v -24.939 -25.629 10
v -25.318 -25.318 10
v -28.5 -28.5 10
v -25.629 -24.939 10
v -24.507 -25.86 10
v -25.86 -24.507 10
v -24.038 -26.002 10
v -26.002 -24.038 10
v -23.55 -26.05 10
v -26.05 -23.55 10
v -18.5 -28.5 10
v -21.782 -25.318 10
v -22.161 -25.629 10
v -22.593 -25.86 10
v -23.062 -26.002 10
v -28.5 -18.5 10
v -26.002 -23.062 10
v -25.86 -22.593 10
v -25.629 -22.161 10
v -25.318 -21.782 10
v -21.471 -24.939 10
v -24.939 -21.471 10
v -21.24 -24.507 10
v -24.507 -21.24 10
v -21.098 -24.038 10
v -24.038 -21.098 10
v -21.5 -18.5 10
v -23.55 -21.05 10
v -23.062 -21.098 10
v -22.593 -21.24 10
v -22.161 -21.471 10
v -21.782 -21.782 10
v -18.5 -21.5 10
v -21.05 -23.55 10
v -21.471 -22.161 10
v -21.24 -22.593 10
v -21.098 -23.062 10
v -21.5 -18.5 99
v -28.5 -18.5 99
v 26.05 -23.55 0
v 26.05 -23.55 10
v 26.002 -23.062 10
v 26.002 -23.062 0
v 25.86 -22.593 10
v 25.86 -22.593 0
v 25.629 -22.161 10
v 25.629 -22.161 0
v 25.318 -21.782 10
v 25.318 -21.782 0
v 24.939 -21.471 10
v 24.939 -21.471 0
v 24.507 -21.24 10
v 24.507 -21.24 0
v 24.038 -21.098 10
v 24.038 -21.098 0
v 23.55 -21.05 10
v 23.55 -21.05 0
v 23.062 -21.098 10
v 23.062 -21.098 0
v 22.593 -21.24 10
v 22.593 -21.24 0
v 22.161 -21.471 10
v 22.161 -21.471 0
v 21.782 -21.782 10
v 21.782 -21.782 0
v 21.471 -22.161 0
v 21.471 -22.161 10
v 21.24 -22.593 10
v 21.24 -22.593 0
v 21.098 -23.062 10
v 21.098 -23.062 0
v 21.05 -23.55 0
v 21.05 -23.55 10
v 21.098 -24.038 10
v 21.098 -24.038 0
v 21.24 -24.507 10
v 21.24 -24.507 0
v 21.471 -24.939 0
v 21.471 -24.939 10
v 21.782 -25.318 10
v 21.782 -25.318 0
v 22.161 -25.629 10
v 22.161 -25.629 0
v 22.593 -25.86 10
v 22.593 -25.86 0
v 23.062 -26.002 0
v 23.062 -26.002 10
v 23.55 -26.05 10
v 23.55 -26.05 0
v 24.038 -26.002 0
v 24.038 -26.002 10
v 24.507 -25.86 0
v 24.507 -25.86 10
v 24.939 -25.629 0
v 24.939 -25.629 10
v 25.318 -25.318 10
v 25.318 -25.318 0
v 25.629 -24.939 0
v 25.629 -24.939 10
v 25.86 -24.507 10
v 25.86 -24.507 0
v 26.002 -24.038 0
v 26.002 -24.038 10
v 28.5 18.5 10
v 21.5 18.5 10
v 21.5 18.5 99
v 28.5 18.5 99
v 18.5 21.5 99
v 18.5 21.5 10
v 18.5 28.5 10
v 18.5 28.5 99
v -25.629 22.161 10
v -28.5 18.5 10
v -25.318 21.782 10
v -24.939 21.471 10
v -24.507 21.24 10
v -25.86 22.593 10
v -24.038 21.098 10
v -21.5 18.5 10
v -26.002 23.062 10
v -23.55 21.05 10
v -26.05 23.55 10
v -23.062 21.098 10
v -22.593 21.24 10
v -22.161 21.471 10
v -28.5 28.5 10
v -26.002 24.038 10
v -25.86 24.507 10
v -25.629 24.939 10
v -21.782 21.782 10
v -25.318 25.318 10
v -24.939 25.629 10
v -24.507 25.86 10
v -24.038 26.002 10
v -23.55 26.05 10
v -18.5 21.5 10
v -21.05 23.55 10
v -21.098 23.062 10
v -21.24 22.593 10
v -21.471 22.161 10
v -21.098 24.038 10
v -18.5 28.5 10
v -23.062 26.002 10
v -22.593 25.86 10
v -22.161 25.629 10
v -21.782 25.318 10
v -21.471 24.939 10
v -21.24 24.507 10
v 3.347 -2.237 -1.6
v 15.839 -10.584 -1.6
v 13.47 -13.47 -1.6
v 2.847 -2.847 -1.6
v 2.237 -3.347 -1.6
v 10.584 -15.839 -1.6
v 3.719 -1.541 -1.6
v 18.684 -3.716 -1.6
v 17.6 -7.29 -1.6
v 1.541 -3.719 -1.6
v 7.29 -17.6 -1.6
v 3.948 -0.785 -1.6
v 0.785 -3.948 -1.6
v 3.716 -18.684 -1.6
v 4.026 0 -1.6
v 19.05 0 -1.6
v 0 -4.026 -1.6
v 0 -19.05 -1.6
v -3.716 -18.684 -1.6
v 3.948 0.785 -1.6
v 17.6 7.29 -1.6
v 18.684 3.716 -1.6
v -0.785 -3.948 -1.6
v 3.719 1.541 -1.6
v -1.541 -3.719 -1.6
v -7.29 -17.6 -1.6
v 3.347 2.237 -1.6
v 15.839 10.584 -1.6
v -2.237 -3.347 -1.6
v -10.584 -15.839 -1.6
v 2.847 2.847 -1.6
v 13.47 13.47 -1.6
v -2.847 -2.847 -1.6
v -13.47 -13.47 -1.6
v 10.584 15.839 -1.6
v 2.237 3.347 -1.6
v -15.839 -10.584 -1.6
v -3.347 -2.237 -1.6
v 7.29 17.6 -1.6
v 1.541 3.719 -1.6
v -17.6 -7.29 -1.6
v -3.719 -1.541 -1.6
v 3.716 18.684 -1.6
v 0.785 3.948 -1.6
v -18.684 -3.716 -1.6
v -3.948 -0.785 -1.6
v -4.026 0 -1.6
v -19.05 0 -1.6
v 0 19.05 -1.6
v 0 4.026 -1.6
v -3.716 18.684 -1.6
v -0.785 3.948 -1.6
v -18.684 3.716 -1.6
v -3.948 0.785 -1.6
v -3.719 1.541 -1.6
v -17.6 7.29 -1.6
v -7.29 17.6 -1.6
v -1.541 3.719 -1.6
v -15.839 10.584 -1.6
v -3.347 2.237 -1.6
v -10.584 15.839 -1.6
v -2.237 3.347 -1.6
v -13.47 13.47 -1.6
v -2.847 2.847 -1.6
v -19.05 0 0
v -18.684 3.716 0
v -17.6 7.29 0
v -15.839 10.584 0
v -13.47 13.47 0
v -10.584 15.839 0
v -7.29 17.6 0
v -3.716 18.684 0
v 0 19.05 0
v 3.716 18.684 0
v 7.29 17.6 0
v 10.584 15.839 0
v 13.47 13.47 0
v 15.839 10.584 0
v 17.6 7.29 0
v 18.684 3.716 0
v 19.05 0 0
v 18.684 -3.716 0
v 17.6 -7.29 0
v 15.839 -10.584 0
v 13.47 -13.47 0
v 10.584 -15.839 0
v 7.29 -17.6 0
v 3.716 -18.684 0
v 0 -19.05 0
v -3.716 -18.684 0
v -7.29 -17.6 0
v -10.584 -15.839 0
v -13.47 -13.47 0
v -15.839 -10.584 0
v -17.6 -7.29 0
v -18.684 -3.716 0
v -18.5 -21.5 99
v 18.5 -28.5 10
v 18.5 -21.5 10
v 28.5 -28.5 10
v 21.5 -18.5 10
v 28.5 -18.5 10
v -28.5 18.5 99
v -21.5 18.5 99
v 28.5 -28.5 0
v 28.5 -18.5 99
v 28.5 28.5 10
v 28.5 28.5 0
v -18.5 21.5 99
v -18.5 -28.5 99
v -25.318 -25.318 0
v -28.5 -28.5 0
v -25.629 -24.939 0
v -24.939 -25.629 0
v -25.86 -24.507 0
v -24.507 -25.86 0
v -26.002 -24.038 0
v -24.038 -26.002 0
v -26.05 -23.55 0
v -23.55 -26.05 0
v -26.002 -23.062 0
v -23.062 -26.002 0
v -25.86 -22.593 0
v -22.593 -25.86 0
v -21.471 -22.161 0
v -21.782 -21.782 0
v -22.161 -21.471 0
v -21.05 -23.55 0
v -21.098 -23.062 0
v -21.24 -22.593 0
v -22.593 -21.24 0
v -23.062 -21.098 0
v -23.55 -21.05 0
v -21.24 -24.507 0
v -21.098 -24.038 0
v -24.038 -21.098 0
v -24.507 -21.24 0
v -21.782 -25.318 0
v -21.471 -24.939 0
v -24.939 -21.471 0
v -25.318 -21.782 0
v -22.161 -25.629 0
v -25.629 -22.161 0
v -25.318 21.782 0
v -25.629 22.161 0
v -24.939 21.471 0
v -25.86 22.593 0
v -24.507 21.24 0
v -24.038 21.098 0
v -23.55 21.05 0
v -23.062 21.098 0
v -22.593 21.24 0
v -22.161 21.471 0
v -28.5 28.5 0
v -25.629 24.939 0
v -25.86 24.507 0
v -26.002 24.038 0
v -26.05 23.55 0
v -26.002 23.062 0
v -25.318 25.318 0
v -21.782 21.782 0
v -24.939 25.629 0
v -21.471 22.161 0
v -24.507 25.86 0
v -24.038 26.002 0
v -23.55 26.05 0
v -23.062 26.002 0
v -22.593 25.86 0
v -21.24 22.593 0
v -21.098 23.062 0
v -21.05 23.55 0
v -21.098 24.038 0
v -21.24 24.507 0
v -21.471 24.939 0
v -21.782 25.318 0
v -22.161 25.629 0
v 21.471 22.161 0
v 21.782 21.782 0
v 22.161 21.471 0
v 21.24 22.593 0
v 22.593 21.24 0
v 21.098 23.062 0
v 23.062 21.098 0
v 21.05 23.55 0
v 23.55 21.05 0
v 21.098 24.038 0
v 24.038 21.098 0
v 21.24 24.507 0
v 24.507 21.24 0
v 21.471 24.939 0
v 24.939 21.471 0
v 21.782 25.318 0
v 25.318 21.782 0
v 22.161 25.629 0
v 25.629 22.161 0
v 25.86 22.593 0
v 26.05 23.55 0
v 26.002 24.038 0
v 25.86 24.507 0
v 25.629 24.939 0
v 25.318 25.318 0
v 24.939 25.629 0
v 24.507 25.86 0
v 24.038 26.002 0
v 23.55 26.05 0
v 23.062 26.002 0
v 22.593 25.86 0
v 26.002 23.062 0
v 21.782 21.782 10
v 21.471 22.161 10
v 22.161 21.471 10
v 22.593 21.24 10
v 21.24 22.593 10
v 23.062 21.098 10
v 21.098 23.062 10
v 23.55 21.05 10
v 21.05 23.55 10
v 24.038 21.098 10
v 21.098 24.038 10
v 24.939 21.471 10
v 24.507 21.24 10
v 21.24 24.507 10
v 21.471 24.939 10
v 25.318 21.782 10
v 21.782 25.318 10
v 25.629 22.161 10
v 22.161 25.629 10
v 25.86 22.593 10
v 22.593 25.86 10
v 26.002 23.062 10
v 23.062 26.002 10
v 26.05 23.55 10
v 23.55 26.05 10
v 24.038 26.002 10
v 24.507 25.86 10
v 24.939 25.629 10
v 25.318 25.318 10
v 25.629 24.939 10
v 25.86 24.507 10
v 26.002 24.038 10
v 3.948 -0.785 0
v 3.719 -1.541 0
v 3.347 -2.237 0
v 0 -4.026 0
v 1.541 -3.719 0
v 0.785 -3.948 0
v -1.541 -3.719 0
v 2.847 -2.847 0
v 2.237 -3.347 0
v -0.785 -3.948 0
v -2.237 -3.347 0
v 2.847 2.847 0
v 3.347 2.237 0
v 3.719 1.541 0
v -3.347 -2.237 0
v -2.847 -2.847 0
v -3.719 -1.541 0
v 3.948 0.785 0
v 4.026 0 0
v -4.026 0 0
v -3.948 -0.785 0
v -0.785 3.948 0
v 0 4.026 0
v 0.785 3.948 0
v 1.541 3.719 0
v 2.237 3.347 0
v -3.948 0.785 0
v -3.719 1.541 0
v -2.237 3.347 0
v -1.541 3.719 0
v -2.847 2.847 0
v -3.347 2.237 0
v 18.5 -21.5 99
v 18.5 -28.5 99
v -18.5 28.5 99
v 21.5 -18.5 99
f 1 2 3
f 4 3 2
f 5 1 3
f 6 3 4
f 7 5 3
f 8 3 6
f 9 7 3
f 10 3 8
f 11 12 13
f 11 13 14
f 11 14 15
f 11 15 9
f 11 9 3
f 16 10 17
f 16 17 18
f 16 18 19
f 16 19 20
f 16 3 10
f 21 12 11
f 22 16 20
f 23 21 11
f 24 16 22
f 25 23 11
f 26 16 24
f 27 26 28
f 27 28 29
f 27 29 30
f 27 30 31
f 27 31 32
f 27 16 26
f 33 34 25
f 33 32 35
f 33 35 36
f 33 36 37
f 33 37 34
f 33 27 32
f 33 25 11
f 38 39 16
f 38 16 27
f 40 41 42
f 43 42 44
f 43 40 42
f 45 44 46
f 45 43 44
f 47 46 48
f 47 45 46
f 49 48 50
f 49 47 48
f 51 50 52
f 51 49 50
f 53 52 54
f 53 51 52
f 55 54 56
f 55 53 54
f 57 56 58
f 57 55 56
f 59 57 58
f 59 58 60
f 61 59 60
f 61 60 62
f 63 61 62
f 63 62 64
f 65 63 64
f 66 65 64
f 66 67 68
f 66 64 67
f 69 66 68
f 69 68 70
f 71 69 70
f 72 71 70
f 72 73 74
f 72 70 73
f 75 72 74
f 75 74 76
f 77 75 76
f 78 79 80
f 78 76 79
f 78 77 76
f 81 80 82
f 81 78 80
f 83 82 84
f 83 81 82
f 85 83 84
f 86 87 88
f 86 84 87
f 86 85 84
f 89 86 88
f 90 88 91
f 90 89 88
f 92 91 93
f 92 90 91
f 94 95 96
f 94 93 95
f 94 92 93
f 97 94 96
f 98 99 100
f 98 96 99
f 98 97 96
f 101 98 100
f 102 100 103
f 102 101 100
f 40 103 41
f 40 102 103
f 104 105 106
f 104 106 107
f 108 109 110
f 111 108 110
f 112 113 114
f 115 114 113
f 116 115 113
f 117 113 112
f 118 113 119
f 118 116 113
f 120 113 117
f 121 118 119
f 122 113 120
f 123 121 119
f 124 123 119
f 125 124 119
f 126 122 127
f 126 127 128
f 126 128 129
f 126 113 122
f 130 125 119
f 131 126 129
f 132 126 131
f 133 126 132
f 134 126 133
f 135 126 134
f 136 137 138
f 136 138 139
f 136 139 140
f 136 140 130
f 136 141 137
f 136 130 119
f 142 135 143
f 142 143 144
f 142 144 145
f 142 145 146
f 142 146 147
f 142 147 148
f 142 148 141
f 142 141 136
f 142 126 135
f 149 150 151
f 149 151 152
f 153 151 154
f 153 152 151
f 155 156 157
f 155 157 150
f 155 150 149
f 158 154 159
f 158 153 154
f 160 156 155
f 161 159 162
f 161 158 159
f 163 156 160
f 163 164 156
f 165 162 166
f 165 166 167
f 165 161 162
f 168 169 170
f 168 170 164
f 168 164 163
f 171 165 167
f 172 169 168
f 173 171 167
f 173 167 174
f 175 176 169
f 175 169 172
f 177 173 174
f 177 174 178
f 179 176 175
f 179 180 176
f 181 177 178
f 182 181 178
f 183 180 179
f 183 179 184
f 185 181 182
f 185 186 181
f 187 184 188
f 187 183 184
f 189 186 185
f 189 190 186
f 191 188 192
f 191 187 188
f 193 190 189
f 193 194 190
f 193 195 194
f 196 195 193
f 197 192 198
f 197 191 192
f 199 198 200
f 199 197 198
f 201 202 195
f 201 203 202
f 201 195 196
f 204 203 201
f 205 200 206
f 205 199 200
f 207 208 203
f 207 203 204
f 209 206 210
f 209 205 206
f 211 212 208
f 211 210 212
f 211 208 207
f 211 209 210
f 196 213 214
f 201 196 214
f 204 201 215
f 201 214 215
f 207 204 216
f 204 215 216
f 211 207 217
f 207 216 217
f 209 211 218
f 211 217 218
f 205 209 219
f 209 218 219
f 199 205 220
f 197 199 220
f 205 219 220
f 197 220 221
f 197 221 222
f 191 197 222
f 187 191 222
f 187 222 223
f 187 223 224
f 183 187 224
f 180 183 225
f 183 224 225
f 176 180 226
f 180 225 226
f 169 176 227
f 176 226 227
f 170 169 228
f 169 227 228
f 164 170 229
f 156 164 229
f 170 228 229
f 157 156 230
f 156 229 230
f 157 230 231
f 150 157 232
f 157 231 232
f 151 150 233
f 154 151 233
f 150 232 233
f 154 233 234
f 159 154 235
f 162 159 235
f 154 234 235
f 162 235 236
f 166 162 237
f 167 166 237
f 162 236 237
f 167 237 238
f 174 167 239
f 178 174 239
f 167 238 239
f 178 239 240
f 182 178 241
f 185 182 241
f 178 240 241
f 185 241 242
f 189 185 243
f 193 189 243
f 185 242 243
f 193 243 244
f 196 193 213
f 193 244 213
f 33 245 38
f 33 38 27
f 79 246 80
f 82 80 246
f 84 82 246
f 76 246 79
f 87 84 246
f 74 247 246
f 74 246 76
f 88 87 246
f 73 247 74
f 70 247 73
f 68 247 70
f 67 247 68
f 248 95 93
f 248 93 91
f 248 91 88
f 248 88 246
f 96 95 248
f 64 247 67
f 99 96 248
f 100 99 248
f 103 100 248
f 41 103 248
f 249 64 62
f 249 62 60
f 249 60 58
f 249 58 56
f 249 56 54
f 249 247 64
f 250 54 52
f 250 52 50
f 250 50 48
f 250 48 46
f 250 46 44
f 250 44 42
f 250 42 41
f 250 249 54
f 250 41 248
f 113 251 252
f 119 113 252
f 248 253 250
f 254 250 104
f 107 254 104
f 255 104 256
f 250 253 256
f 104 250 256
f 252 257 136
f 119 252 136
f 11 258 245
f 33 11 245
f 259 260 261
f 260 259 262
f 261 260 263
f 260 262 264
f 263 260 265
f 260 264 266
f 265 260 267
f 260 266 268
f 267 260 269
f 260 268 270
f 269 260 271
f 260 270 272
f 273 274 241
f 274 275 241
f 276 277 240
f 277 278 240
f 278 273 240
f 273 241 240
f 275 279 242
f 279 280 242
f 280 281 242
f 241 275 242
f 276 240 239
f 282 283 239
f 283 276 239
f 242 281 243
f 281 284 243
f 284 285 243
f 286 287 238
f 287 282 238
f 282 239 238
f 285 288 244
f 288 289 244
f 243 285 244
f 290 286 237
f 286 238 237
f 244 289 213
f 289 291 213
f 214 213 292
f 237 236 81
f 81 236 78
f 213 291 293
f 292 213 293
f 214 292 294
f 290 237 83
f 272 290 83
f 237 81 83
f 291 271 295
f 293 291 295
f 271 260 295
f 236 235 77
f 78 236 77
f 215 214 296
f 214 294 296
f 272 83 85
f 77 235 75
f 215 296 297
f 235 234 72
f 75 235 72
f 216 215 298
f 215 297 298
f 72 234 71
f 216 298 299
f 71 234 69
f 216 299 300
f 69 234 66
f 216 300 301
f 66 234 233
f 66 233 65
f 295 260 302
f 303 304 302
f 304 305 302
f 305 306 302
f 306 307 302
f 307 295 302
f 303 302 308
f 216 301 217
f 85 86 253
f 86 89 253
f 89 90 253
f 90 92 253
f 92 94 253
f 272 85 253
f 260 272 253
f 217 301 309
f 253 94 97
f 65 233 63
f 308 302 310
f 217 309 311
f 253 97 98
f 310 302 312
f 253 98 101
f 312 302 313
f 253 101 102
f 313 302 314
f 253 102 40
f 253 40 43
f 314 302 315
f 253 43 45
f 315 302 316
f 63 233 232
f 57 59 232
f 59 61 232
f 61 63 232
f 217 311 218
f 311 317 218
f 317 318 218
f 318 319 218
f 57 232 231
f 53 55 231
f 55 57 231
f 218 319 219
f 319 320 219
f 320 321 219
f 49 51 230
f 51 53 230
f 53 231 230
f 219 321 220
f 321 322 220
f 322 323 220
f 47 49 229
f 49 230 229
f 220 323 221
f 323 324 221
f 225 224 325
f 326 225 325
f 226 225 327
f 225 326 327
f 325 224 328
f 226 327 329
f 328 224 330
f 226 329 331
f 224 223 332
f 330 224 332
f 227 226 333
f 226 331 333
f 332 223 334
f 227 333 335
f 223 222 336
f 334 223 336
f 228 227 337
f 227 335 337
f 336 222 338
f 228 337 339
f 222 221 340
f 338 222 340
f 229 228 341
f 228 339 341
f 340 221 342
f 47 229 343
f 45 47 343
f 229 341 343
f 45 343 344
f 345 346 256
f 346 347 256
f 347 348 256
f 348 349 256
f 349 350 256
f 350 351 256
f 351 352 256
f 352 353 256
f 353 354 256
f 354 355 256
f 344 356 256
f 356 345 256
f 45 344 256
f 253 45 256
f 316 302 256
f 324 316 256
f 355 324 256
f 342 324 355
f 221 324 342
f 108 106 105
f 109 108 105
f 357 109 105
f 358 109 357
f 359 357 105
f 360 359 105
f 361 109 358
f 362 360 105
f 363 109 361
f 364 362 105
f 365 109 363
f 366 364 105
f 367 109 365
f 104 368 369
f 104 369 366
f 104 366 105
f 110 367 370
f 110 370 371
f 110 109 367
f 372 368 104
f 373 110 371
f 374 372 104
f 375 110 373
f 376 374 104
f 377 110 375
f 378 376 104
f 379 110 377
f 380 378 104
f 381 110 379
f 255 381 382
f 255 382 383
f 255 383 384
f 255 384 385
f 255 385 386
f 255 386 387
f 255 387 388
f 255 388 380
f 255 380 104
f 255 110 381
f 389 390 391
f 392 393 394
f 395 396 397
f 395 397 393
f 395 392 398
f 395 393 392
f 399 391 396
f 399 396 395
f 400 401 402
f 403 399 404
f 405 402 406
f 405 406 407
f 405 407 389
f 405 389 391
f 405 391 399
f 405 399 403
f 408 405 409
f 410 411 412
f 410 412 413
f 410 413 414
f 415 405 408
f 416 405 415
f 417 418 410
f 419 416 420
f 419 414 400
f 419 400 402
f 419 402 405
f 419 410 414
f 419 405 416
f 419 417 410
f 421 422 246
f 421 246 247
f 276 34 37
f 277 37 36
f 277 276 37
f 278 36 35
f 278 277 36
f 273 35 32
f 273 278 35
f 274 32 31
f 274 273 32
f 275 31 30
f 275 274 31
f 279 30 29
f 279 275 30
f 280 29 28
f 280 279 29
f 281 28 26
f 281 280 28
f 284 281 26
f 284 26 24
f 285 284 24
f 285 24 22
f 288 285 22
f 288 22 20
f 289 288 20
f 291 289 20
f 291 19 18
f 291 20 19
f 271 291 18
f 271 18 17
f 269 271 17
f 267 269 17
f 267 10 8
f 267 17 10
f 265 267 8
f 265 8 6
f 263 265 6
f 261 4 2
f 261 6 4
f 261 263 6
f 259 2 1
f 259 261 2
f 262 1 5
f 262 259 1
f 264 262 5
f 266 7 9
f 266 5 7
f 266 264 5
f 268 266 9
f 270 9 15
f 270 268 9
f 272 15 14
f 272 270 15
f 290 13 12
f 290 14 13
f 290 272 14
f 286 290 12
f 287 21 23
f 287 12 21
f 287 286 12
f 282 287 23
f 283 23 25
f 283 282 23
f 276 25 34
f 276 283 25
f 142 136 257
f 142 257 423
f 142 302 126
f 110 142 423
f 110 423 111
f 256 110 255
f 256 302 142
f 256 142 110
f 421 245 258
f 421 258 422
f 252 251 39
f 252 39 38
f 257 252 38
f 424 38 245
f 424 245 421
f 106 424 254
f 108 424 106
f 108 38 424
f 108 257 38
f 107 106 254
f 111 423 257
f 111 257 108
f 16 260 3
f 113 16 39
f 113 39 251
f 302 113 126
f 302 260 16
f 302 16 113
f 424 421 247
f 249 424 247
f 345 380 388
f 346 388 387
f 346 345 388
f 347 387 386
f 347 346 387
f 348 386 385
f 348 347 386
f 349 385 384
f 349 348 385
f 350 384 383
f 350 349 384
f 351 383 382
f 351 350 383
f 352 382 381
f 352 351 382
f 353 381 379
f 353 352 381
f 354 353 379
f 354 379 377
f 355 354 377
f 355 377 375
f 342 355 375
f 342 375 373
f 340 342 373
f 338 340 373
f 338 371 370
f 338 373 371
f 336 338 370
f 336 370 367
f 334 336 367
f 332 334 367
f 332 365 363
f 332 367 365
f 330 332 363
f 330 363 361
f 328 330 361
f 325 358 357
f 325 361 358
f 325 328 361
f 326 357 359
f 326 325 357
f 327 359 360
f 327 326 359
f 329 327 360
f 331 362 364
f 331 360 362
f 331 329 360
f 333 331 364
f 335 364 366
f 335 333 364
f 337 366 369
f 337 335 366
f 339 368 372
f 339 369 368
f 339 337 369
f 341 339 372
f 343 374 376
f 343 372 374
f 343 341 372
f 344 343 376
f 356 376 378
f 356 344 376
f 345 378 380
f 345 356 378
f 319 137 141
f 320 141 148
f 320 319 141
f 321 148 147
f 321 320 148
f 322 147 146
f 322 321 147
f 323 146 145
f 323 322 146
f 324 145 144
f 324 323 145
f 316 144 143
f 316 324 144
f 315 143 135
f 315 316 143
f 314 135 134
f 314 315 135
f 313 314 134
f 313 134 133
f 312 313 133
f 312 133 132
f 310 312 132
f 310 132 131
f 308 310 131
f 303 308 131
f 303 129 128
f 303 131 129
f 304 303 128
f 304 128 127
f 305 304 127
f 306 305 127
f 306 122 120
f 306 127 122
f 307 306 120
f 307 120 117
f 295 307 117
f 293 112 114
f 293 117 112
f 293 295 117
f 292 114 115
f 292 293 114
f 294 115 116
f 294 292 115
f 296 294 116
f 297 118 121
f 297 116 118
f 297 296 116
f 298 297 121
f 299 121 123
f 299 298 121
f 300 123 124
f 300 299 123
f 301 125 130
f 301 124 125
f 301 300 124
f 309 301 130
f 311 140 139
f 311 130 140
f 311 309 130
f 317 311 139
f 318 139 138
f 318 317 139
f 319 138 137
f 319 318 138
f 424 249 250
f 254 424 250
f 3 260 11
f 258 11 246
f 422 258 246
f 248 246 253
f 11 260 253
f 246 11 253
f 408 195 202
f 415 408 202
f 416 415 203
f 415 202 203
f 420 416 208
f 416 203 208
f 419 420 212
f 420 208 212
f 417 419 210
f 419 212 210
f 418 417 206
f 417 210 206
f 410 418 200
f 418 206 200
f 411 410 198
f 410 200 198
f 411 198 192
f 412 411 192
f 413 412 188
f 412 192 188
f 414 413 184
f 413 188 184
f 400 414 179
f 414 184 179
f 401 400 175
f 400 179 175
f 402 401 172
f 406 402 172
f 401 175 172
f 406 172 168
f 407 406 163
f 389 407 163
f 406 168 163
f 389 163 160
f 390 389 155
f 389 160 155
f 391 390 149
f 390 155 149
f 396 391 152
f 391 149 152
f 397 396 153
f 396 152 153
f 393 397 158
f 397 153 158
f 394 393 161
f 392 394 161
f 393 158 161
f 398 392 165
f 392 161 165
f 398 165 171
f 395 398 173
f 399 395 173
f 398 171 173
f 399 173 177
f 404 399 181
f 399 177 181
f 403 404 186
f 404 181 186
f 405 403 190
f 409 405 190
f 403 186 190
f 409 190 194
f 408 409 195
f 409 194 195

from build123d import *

# Parameters (mm, degrees)
SKETCH1_W           = 57
SKETCH1_H           = 57
SKETCH1_R           = 2.5
BOSS_EXTRUDE2_DEPTH = 99
SKETCH3_W           = 10
SKETCH3_H           = 10
CUT_EXTRUDE1_DEPTH  = 89
CHAMFER1_SIZE       = 3
SKETCH4_R           = 19.05
BOSS_EXTRUDE5_DEPTH = 1.6
SKETCH9_R           = 4.025639025
CUT_EXTRUDE3_DEPTH  = 1.6


with BuildPart() as part:
    # Sketch1 → Boss-Extrude2 (new body)
    with BuildSketch(Plane.XY):
        Rectangle(SKETCH1_W, SKETCH1_H)
        with Locations((23.55, -23.55)):
            Circle(SKETCH1_R, mode=Mode.SUBTRACT)
        with Locations((23.55, 23.55)):
            Circle(SKETCH1_R, mode=Mode.SUBTRACT)
        with Locations((-23.55, 23.55)):
            Circle(SKETCH1_R, mode=Mode.SUBTRACT)
        with Locations((-23.55, -23.55)):
            Circle(SKETCH1_R, mode=Mode.SUBTRACT)
    extrude(amount=BOSS_EXTRUDE2_DEPTH)

    # Sketch3 → Cut-Extrude1 (cut)
    with BuildSketch(Plane.XY.offset(99)):
        with Locations((-23.5, 23.5)):
            Rectangle(SKETCH3_W, SKETCH3_H)
        with Locations((-23.5, -23.5)):
            Rectangle(SKETCH3_W, SKETCH3_H)
        with Locations((23.5, -23.5)):
            Rectangle(SKETCH3_W, SKETCH3_H)
        with Locations((23.5, 23.5)):
            Rectangle(SKETCH3_W, SKETCH3_H)
    extrude(amount=-CUT_EXTRUDE1_DEPTH, mode=Mode.SUBTRACT)

    # Chamfer1
    chamfer1_edges = [part.edges().sort_by_distance(p)[0] for p in [
        (-18.5, -18.5, 54.5),
        (18.5, -18.5, 54.5),
        (18.5, 18.5, 54.5),
        (-18.5, 18.5, 54.5),
    ]]
    chamfer(chamfer1_edges, length=CHAMFER1_SIZE)

    # Sketch4 → Boss-Extrude5 (add)
    with BuildSketch(Plane(origin=(0, 0, 0), x_dir=(-1, 0, 0), z_dir=(0, 0, -1))):
        Circle(SKETCH4_R)
    extrude(amount=BOSS_EXTRUDE5_DEPTH)

    # Sketch9 → Cut-Extrude3 (cut)
    with BuildSketch(Plane(origin=(0, 0, -1.6), x_dir=(-1, 0, 0), z_dir=(0, 0, -1))):
        Circle(SKETCH9_R)
    extrude(amount=-CUT_EXTRUDE3_DEPTH, mode=Mode.SUBTRACT)


solid = part.part
